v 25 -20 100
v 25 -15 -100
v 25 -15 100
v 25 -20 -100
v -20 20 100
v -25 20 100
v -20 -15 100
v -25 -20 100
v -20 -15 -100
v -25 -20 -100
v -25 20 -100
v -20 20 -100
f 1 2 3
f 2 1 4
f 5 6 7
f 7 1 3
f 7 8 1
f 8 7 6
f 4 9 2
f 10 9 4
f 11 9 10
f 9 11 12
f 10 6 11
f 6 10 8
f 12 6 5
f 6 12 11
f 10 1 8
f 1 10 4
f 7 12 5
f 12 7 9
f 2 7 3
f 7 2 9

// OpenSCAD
module angled(l, dim = [20, 20, 2, 3], a = [[0, 0], [0, 0]], rot = [0, 0, 0], pos = [0, 0, 0]) {
  w = dim[0];
  h = dim[1];
  d = dim[2];
  r = dim[3];

  translate(pos) {
    rotate(rot) {
      difference() {
        cube([w, h, l], center = true);
        translate([d, d, 0]) {
          cube([w, h, l + 1], center = true);
        }
        cube();

        for (i = [0 : 1]) {
          if (a[i] != [0, 0]) {
            q = 1.1;
            w2 = w / 2 * q;
            h2 = h / 2 * q;

            wt = w * tan(a[i][0]) * q;
            ht = h * tan(a[i][1]) * q;

            l2 = (l + w * tan(a[i][0]) * (q - 1) + h * tan(a[i][1]) * (q - 1)) / 2 +
              (wt < 0 ? wt / q : 0) + (ht < 0 ? ht / q : 0);
            
            lm = l2 + abs(ht) + abs(wt);

            m = i == 0 ? 1 : -1;
            polyhedron(points = [[-w2, -h2, m * (l2 - ht)], [w2, -h2, m * (l2 - wt - ht)],
                                  [w2,  h2,  m * (l2 - wt)], [-w2, h2, m * (l2)],
                                  [-w2, -h2, m * (lm - ht)], [w2, -h2, m * (lm - wt - ht)],
                                  [w2,  h2,  m * (lm - wt)], [-w2, h2, m * (lm)]],
              faces = [[0, 1, 2, 3], [0, 3, 7, 4],
                       [5, 6, 2, 1], [4, 5, 1, 0],
                       [6, 7, 3, 2], [7, 6, 5, 4]],
              convexity = 0);
          }
        }

      }
    }
  }


}

l1 = 200;
l2 = 100;
w = 50;
h = 40;

angled(l1, [w, h, 5, 10], a = [[0, 0], [0, 0]], rot = [0, 0, 0], pos = [0, 0, 0]);
/*
square_tube(l1, [w, h, 2, 3], a = [[45, 0], [45, 0]], rot = [0, 0, 0], pos = [10, 20, 100]);
square_tube(l1, [w, h, 2, 3], a = [[45, 0], [45, 0]], rot = [0, 0, 180], pos = [l2 - w + 10, 20, 100]);

square_tube(l2, [w, h, 2, 3], a = [[45, 0], [45, 0]], rot = [0, 90, 0], pos = [(l2 - w) / 2 + 10, 20, l1 - w / 2]);
square_tube(l2, [w, h, 2, 3], a = [[45, 0], [45, 0]], rot = [0, -90, 0], pos = [(l2 - w) / 2 + 10, 20, w / 2]);

square_tube(l2 - 2 * w, [w, h, 2, 3], a = [[0, 0], [0, 0]], rot = [0, 90, 0], pos = [(l2 - w) / 2 + 10, 20, l1 / 2]);
*/
